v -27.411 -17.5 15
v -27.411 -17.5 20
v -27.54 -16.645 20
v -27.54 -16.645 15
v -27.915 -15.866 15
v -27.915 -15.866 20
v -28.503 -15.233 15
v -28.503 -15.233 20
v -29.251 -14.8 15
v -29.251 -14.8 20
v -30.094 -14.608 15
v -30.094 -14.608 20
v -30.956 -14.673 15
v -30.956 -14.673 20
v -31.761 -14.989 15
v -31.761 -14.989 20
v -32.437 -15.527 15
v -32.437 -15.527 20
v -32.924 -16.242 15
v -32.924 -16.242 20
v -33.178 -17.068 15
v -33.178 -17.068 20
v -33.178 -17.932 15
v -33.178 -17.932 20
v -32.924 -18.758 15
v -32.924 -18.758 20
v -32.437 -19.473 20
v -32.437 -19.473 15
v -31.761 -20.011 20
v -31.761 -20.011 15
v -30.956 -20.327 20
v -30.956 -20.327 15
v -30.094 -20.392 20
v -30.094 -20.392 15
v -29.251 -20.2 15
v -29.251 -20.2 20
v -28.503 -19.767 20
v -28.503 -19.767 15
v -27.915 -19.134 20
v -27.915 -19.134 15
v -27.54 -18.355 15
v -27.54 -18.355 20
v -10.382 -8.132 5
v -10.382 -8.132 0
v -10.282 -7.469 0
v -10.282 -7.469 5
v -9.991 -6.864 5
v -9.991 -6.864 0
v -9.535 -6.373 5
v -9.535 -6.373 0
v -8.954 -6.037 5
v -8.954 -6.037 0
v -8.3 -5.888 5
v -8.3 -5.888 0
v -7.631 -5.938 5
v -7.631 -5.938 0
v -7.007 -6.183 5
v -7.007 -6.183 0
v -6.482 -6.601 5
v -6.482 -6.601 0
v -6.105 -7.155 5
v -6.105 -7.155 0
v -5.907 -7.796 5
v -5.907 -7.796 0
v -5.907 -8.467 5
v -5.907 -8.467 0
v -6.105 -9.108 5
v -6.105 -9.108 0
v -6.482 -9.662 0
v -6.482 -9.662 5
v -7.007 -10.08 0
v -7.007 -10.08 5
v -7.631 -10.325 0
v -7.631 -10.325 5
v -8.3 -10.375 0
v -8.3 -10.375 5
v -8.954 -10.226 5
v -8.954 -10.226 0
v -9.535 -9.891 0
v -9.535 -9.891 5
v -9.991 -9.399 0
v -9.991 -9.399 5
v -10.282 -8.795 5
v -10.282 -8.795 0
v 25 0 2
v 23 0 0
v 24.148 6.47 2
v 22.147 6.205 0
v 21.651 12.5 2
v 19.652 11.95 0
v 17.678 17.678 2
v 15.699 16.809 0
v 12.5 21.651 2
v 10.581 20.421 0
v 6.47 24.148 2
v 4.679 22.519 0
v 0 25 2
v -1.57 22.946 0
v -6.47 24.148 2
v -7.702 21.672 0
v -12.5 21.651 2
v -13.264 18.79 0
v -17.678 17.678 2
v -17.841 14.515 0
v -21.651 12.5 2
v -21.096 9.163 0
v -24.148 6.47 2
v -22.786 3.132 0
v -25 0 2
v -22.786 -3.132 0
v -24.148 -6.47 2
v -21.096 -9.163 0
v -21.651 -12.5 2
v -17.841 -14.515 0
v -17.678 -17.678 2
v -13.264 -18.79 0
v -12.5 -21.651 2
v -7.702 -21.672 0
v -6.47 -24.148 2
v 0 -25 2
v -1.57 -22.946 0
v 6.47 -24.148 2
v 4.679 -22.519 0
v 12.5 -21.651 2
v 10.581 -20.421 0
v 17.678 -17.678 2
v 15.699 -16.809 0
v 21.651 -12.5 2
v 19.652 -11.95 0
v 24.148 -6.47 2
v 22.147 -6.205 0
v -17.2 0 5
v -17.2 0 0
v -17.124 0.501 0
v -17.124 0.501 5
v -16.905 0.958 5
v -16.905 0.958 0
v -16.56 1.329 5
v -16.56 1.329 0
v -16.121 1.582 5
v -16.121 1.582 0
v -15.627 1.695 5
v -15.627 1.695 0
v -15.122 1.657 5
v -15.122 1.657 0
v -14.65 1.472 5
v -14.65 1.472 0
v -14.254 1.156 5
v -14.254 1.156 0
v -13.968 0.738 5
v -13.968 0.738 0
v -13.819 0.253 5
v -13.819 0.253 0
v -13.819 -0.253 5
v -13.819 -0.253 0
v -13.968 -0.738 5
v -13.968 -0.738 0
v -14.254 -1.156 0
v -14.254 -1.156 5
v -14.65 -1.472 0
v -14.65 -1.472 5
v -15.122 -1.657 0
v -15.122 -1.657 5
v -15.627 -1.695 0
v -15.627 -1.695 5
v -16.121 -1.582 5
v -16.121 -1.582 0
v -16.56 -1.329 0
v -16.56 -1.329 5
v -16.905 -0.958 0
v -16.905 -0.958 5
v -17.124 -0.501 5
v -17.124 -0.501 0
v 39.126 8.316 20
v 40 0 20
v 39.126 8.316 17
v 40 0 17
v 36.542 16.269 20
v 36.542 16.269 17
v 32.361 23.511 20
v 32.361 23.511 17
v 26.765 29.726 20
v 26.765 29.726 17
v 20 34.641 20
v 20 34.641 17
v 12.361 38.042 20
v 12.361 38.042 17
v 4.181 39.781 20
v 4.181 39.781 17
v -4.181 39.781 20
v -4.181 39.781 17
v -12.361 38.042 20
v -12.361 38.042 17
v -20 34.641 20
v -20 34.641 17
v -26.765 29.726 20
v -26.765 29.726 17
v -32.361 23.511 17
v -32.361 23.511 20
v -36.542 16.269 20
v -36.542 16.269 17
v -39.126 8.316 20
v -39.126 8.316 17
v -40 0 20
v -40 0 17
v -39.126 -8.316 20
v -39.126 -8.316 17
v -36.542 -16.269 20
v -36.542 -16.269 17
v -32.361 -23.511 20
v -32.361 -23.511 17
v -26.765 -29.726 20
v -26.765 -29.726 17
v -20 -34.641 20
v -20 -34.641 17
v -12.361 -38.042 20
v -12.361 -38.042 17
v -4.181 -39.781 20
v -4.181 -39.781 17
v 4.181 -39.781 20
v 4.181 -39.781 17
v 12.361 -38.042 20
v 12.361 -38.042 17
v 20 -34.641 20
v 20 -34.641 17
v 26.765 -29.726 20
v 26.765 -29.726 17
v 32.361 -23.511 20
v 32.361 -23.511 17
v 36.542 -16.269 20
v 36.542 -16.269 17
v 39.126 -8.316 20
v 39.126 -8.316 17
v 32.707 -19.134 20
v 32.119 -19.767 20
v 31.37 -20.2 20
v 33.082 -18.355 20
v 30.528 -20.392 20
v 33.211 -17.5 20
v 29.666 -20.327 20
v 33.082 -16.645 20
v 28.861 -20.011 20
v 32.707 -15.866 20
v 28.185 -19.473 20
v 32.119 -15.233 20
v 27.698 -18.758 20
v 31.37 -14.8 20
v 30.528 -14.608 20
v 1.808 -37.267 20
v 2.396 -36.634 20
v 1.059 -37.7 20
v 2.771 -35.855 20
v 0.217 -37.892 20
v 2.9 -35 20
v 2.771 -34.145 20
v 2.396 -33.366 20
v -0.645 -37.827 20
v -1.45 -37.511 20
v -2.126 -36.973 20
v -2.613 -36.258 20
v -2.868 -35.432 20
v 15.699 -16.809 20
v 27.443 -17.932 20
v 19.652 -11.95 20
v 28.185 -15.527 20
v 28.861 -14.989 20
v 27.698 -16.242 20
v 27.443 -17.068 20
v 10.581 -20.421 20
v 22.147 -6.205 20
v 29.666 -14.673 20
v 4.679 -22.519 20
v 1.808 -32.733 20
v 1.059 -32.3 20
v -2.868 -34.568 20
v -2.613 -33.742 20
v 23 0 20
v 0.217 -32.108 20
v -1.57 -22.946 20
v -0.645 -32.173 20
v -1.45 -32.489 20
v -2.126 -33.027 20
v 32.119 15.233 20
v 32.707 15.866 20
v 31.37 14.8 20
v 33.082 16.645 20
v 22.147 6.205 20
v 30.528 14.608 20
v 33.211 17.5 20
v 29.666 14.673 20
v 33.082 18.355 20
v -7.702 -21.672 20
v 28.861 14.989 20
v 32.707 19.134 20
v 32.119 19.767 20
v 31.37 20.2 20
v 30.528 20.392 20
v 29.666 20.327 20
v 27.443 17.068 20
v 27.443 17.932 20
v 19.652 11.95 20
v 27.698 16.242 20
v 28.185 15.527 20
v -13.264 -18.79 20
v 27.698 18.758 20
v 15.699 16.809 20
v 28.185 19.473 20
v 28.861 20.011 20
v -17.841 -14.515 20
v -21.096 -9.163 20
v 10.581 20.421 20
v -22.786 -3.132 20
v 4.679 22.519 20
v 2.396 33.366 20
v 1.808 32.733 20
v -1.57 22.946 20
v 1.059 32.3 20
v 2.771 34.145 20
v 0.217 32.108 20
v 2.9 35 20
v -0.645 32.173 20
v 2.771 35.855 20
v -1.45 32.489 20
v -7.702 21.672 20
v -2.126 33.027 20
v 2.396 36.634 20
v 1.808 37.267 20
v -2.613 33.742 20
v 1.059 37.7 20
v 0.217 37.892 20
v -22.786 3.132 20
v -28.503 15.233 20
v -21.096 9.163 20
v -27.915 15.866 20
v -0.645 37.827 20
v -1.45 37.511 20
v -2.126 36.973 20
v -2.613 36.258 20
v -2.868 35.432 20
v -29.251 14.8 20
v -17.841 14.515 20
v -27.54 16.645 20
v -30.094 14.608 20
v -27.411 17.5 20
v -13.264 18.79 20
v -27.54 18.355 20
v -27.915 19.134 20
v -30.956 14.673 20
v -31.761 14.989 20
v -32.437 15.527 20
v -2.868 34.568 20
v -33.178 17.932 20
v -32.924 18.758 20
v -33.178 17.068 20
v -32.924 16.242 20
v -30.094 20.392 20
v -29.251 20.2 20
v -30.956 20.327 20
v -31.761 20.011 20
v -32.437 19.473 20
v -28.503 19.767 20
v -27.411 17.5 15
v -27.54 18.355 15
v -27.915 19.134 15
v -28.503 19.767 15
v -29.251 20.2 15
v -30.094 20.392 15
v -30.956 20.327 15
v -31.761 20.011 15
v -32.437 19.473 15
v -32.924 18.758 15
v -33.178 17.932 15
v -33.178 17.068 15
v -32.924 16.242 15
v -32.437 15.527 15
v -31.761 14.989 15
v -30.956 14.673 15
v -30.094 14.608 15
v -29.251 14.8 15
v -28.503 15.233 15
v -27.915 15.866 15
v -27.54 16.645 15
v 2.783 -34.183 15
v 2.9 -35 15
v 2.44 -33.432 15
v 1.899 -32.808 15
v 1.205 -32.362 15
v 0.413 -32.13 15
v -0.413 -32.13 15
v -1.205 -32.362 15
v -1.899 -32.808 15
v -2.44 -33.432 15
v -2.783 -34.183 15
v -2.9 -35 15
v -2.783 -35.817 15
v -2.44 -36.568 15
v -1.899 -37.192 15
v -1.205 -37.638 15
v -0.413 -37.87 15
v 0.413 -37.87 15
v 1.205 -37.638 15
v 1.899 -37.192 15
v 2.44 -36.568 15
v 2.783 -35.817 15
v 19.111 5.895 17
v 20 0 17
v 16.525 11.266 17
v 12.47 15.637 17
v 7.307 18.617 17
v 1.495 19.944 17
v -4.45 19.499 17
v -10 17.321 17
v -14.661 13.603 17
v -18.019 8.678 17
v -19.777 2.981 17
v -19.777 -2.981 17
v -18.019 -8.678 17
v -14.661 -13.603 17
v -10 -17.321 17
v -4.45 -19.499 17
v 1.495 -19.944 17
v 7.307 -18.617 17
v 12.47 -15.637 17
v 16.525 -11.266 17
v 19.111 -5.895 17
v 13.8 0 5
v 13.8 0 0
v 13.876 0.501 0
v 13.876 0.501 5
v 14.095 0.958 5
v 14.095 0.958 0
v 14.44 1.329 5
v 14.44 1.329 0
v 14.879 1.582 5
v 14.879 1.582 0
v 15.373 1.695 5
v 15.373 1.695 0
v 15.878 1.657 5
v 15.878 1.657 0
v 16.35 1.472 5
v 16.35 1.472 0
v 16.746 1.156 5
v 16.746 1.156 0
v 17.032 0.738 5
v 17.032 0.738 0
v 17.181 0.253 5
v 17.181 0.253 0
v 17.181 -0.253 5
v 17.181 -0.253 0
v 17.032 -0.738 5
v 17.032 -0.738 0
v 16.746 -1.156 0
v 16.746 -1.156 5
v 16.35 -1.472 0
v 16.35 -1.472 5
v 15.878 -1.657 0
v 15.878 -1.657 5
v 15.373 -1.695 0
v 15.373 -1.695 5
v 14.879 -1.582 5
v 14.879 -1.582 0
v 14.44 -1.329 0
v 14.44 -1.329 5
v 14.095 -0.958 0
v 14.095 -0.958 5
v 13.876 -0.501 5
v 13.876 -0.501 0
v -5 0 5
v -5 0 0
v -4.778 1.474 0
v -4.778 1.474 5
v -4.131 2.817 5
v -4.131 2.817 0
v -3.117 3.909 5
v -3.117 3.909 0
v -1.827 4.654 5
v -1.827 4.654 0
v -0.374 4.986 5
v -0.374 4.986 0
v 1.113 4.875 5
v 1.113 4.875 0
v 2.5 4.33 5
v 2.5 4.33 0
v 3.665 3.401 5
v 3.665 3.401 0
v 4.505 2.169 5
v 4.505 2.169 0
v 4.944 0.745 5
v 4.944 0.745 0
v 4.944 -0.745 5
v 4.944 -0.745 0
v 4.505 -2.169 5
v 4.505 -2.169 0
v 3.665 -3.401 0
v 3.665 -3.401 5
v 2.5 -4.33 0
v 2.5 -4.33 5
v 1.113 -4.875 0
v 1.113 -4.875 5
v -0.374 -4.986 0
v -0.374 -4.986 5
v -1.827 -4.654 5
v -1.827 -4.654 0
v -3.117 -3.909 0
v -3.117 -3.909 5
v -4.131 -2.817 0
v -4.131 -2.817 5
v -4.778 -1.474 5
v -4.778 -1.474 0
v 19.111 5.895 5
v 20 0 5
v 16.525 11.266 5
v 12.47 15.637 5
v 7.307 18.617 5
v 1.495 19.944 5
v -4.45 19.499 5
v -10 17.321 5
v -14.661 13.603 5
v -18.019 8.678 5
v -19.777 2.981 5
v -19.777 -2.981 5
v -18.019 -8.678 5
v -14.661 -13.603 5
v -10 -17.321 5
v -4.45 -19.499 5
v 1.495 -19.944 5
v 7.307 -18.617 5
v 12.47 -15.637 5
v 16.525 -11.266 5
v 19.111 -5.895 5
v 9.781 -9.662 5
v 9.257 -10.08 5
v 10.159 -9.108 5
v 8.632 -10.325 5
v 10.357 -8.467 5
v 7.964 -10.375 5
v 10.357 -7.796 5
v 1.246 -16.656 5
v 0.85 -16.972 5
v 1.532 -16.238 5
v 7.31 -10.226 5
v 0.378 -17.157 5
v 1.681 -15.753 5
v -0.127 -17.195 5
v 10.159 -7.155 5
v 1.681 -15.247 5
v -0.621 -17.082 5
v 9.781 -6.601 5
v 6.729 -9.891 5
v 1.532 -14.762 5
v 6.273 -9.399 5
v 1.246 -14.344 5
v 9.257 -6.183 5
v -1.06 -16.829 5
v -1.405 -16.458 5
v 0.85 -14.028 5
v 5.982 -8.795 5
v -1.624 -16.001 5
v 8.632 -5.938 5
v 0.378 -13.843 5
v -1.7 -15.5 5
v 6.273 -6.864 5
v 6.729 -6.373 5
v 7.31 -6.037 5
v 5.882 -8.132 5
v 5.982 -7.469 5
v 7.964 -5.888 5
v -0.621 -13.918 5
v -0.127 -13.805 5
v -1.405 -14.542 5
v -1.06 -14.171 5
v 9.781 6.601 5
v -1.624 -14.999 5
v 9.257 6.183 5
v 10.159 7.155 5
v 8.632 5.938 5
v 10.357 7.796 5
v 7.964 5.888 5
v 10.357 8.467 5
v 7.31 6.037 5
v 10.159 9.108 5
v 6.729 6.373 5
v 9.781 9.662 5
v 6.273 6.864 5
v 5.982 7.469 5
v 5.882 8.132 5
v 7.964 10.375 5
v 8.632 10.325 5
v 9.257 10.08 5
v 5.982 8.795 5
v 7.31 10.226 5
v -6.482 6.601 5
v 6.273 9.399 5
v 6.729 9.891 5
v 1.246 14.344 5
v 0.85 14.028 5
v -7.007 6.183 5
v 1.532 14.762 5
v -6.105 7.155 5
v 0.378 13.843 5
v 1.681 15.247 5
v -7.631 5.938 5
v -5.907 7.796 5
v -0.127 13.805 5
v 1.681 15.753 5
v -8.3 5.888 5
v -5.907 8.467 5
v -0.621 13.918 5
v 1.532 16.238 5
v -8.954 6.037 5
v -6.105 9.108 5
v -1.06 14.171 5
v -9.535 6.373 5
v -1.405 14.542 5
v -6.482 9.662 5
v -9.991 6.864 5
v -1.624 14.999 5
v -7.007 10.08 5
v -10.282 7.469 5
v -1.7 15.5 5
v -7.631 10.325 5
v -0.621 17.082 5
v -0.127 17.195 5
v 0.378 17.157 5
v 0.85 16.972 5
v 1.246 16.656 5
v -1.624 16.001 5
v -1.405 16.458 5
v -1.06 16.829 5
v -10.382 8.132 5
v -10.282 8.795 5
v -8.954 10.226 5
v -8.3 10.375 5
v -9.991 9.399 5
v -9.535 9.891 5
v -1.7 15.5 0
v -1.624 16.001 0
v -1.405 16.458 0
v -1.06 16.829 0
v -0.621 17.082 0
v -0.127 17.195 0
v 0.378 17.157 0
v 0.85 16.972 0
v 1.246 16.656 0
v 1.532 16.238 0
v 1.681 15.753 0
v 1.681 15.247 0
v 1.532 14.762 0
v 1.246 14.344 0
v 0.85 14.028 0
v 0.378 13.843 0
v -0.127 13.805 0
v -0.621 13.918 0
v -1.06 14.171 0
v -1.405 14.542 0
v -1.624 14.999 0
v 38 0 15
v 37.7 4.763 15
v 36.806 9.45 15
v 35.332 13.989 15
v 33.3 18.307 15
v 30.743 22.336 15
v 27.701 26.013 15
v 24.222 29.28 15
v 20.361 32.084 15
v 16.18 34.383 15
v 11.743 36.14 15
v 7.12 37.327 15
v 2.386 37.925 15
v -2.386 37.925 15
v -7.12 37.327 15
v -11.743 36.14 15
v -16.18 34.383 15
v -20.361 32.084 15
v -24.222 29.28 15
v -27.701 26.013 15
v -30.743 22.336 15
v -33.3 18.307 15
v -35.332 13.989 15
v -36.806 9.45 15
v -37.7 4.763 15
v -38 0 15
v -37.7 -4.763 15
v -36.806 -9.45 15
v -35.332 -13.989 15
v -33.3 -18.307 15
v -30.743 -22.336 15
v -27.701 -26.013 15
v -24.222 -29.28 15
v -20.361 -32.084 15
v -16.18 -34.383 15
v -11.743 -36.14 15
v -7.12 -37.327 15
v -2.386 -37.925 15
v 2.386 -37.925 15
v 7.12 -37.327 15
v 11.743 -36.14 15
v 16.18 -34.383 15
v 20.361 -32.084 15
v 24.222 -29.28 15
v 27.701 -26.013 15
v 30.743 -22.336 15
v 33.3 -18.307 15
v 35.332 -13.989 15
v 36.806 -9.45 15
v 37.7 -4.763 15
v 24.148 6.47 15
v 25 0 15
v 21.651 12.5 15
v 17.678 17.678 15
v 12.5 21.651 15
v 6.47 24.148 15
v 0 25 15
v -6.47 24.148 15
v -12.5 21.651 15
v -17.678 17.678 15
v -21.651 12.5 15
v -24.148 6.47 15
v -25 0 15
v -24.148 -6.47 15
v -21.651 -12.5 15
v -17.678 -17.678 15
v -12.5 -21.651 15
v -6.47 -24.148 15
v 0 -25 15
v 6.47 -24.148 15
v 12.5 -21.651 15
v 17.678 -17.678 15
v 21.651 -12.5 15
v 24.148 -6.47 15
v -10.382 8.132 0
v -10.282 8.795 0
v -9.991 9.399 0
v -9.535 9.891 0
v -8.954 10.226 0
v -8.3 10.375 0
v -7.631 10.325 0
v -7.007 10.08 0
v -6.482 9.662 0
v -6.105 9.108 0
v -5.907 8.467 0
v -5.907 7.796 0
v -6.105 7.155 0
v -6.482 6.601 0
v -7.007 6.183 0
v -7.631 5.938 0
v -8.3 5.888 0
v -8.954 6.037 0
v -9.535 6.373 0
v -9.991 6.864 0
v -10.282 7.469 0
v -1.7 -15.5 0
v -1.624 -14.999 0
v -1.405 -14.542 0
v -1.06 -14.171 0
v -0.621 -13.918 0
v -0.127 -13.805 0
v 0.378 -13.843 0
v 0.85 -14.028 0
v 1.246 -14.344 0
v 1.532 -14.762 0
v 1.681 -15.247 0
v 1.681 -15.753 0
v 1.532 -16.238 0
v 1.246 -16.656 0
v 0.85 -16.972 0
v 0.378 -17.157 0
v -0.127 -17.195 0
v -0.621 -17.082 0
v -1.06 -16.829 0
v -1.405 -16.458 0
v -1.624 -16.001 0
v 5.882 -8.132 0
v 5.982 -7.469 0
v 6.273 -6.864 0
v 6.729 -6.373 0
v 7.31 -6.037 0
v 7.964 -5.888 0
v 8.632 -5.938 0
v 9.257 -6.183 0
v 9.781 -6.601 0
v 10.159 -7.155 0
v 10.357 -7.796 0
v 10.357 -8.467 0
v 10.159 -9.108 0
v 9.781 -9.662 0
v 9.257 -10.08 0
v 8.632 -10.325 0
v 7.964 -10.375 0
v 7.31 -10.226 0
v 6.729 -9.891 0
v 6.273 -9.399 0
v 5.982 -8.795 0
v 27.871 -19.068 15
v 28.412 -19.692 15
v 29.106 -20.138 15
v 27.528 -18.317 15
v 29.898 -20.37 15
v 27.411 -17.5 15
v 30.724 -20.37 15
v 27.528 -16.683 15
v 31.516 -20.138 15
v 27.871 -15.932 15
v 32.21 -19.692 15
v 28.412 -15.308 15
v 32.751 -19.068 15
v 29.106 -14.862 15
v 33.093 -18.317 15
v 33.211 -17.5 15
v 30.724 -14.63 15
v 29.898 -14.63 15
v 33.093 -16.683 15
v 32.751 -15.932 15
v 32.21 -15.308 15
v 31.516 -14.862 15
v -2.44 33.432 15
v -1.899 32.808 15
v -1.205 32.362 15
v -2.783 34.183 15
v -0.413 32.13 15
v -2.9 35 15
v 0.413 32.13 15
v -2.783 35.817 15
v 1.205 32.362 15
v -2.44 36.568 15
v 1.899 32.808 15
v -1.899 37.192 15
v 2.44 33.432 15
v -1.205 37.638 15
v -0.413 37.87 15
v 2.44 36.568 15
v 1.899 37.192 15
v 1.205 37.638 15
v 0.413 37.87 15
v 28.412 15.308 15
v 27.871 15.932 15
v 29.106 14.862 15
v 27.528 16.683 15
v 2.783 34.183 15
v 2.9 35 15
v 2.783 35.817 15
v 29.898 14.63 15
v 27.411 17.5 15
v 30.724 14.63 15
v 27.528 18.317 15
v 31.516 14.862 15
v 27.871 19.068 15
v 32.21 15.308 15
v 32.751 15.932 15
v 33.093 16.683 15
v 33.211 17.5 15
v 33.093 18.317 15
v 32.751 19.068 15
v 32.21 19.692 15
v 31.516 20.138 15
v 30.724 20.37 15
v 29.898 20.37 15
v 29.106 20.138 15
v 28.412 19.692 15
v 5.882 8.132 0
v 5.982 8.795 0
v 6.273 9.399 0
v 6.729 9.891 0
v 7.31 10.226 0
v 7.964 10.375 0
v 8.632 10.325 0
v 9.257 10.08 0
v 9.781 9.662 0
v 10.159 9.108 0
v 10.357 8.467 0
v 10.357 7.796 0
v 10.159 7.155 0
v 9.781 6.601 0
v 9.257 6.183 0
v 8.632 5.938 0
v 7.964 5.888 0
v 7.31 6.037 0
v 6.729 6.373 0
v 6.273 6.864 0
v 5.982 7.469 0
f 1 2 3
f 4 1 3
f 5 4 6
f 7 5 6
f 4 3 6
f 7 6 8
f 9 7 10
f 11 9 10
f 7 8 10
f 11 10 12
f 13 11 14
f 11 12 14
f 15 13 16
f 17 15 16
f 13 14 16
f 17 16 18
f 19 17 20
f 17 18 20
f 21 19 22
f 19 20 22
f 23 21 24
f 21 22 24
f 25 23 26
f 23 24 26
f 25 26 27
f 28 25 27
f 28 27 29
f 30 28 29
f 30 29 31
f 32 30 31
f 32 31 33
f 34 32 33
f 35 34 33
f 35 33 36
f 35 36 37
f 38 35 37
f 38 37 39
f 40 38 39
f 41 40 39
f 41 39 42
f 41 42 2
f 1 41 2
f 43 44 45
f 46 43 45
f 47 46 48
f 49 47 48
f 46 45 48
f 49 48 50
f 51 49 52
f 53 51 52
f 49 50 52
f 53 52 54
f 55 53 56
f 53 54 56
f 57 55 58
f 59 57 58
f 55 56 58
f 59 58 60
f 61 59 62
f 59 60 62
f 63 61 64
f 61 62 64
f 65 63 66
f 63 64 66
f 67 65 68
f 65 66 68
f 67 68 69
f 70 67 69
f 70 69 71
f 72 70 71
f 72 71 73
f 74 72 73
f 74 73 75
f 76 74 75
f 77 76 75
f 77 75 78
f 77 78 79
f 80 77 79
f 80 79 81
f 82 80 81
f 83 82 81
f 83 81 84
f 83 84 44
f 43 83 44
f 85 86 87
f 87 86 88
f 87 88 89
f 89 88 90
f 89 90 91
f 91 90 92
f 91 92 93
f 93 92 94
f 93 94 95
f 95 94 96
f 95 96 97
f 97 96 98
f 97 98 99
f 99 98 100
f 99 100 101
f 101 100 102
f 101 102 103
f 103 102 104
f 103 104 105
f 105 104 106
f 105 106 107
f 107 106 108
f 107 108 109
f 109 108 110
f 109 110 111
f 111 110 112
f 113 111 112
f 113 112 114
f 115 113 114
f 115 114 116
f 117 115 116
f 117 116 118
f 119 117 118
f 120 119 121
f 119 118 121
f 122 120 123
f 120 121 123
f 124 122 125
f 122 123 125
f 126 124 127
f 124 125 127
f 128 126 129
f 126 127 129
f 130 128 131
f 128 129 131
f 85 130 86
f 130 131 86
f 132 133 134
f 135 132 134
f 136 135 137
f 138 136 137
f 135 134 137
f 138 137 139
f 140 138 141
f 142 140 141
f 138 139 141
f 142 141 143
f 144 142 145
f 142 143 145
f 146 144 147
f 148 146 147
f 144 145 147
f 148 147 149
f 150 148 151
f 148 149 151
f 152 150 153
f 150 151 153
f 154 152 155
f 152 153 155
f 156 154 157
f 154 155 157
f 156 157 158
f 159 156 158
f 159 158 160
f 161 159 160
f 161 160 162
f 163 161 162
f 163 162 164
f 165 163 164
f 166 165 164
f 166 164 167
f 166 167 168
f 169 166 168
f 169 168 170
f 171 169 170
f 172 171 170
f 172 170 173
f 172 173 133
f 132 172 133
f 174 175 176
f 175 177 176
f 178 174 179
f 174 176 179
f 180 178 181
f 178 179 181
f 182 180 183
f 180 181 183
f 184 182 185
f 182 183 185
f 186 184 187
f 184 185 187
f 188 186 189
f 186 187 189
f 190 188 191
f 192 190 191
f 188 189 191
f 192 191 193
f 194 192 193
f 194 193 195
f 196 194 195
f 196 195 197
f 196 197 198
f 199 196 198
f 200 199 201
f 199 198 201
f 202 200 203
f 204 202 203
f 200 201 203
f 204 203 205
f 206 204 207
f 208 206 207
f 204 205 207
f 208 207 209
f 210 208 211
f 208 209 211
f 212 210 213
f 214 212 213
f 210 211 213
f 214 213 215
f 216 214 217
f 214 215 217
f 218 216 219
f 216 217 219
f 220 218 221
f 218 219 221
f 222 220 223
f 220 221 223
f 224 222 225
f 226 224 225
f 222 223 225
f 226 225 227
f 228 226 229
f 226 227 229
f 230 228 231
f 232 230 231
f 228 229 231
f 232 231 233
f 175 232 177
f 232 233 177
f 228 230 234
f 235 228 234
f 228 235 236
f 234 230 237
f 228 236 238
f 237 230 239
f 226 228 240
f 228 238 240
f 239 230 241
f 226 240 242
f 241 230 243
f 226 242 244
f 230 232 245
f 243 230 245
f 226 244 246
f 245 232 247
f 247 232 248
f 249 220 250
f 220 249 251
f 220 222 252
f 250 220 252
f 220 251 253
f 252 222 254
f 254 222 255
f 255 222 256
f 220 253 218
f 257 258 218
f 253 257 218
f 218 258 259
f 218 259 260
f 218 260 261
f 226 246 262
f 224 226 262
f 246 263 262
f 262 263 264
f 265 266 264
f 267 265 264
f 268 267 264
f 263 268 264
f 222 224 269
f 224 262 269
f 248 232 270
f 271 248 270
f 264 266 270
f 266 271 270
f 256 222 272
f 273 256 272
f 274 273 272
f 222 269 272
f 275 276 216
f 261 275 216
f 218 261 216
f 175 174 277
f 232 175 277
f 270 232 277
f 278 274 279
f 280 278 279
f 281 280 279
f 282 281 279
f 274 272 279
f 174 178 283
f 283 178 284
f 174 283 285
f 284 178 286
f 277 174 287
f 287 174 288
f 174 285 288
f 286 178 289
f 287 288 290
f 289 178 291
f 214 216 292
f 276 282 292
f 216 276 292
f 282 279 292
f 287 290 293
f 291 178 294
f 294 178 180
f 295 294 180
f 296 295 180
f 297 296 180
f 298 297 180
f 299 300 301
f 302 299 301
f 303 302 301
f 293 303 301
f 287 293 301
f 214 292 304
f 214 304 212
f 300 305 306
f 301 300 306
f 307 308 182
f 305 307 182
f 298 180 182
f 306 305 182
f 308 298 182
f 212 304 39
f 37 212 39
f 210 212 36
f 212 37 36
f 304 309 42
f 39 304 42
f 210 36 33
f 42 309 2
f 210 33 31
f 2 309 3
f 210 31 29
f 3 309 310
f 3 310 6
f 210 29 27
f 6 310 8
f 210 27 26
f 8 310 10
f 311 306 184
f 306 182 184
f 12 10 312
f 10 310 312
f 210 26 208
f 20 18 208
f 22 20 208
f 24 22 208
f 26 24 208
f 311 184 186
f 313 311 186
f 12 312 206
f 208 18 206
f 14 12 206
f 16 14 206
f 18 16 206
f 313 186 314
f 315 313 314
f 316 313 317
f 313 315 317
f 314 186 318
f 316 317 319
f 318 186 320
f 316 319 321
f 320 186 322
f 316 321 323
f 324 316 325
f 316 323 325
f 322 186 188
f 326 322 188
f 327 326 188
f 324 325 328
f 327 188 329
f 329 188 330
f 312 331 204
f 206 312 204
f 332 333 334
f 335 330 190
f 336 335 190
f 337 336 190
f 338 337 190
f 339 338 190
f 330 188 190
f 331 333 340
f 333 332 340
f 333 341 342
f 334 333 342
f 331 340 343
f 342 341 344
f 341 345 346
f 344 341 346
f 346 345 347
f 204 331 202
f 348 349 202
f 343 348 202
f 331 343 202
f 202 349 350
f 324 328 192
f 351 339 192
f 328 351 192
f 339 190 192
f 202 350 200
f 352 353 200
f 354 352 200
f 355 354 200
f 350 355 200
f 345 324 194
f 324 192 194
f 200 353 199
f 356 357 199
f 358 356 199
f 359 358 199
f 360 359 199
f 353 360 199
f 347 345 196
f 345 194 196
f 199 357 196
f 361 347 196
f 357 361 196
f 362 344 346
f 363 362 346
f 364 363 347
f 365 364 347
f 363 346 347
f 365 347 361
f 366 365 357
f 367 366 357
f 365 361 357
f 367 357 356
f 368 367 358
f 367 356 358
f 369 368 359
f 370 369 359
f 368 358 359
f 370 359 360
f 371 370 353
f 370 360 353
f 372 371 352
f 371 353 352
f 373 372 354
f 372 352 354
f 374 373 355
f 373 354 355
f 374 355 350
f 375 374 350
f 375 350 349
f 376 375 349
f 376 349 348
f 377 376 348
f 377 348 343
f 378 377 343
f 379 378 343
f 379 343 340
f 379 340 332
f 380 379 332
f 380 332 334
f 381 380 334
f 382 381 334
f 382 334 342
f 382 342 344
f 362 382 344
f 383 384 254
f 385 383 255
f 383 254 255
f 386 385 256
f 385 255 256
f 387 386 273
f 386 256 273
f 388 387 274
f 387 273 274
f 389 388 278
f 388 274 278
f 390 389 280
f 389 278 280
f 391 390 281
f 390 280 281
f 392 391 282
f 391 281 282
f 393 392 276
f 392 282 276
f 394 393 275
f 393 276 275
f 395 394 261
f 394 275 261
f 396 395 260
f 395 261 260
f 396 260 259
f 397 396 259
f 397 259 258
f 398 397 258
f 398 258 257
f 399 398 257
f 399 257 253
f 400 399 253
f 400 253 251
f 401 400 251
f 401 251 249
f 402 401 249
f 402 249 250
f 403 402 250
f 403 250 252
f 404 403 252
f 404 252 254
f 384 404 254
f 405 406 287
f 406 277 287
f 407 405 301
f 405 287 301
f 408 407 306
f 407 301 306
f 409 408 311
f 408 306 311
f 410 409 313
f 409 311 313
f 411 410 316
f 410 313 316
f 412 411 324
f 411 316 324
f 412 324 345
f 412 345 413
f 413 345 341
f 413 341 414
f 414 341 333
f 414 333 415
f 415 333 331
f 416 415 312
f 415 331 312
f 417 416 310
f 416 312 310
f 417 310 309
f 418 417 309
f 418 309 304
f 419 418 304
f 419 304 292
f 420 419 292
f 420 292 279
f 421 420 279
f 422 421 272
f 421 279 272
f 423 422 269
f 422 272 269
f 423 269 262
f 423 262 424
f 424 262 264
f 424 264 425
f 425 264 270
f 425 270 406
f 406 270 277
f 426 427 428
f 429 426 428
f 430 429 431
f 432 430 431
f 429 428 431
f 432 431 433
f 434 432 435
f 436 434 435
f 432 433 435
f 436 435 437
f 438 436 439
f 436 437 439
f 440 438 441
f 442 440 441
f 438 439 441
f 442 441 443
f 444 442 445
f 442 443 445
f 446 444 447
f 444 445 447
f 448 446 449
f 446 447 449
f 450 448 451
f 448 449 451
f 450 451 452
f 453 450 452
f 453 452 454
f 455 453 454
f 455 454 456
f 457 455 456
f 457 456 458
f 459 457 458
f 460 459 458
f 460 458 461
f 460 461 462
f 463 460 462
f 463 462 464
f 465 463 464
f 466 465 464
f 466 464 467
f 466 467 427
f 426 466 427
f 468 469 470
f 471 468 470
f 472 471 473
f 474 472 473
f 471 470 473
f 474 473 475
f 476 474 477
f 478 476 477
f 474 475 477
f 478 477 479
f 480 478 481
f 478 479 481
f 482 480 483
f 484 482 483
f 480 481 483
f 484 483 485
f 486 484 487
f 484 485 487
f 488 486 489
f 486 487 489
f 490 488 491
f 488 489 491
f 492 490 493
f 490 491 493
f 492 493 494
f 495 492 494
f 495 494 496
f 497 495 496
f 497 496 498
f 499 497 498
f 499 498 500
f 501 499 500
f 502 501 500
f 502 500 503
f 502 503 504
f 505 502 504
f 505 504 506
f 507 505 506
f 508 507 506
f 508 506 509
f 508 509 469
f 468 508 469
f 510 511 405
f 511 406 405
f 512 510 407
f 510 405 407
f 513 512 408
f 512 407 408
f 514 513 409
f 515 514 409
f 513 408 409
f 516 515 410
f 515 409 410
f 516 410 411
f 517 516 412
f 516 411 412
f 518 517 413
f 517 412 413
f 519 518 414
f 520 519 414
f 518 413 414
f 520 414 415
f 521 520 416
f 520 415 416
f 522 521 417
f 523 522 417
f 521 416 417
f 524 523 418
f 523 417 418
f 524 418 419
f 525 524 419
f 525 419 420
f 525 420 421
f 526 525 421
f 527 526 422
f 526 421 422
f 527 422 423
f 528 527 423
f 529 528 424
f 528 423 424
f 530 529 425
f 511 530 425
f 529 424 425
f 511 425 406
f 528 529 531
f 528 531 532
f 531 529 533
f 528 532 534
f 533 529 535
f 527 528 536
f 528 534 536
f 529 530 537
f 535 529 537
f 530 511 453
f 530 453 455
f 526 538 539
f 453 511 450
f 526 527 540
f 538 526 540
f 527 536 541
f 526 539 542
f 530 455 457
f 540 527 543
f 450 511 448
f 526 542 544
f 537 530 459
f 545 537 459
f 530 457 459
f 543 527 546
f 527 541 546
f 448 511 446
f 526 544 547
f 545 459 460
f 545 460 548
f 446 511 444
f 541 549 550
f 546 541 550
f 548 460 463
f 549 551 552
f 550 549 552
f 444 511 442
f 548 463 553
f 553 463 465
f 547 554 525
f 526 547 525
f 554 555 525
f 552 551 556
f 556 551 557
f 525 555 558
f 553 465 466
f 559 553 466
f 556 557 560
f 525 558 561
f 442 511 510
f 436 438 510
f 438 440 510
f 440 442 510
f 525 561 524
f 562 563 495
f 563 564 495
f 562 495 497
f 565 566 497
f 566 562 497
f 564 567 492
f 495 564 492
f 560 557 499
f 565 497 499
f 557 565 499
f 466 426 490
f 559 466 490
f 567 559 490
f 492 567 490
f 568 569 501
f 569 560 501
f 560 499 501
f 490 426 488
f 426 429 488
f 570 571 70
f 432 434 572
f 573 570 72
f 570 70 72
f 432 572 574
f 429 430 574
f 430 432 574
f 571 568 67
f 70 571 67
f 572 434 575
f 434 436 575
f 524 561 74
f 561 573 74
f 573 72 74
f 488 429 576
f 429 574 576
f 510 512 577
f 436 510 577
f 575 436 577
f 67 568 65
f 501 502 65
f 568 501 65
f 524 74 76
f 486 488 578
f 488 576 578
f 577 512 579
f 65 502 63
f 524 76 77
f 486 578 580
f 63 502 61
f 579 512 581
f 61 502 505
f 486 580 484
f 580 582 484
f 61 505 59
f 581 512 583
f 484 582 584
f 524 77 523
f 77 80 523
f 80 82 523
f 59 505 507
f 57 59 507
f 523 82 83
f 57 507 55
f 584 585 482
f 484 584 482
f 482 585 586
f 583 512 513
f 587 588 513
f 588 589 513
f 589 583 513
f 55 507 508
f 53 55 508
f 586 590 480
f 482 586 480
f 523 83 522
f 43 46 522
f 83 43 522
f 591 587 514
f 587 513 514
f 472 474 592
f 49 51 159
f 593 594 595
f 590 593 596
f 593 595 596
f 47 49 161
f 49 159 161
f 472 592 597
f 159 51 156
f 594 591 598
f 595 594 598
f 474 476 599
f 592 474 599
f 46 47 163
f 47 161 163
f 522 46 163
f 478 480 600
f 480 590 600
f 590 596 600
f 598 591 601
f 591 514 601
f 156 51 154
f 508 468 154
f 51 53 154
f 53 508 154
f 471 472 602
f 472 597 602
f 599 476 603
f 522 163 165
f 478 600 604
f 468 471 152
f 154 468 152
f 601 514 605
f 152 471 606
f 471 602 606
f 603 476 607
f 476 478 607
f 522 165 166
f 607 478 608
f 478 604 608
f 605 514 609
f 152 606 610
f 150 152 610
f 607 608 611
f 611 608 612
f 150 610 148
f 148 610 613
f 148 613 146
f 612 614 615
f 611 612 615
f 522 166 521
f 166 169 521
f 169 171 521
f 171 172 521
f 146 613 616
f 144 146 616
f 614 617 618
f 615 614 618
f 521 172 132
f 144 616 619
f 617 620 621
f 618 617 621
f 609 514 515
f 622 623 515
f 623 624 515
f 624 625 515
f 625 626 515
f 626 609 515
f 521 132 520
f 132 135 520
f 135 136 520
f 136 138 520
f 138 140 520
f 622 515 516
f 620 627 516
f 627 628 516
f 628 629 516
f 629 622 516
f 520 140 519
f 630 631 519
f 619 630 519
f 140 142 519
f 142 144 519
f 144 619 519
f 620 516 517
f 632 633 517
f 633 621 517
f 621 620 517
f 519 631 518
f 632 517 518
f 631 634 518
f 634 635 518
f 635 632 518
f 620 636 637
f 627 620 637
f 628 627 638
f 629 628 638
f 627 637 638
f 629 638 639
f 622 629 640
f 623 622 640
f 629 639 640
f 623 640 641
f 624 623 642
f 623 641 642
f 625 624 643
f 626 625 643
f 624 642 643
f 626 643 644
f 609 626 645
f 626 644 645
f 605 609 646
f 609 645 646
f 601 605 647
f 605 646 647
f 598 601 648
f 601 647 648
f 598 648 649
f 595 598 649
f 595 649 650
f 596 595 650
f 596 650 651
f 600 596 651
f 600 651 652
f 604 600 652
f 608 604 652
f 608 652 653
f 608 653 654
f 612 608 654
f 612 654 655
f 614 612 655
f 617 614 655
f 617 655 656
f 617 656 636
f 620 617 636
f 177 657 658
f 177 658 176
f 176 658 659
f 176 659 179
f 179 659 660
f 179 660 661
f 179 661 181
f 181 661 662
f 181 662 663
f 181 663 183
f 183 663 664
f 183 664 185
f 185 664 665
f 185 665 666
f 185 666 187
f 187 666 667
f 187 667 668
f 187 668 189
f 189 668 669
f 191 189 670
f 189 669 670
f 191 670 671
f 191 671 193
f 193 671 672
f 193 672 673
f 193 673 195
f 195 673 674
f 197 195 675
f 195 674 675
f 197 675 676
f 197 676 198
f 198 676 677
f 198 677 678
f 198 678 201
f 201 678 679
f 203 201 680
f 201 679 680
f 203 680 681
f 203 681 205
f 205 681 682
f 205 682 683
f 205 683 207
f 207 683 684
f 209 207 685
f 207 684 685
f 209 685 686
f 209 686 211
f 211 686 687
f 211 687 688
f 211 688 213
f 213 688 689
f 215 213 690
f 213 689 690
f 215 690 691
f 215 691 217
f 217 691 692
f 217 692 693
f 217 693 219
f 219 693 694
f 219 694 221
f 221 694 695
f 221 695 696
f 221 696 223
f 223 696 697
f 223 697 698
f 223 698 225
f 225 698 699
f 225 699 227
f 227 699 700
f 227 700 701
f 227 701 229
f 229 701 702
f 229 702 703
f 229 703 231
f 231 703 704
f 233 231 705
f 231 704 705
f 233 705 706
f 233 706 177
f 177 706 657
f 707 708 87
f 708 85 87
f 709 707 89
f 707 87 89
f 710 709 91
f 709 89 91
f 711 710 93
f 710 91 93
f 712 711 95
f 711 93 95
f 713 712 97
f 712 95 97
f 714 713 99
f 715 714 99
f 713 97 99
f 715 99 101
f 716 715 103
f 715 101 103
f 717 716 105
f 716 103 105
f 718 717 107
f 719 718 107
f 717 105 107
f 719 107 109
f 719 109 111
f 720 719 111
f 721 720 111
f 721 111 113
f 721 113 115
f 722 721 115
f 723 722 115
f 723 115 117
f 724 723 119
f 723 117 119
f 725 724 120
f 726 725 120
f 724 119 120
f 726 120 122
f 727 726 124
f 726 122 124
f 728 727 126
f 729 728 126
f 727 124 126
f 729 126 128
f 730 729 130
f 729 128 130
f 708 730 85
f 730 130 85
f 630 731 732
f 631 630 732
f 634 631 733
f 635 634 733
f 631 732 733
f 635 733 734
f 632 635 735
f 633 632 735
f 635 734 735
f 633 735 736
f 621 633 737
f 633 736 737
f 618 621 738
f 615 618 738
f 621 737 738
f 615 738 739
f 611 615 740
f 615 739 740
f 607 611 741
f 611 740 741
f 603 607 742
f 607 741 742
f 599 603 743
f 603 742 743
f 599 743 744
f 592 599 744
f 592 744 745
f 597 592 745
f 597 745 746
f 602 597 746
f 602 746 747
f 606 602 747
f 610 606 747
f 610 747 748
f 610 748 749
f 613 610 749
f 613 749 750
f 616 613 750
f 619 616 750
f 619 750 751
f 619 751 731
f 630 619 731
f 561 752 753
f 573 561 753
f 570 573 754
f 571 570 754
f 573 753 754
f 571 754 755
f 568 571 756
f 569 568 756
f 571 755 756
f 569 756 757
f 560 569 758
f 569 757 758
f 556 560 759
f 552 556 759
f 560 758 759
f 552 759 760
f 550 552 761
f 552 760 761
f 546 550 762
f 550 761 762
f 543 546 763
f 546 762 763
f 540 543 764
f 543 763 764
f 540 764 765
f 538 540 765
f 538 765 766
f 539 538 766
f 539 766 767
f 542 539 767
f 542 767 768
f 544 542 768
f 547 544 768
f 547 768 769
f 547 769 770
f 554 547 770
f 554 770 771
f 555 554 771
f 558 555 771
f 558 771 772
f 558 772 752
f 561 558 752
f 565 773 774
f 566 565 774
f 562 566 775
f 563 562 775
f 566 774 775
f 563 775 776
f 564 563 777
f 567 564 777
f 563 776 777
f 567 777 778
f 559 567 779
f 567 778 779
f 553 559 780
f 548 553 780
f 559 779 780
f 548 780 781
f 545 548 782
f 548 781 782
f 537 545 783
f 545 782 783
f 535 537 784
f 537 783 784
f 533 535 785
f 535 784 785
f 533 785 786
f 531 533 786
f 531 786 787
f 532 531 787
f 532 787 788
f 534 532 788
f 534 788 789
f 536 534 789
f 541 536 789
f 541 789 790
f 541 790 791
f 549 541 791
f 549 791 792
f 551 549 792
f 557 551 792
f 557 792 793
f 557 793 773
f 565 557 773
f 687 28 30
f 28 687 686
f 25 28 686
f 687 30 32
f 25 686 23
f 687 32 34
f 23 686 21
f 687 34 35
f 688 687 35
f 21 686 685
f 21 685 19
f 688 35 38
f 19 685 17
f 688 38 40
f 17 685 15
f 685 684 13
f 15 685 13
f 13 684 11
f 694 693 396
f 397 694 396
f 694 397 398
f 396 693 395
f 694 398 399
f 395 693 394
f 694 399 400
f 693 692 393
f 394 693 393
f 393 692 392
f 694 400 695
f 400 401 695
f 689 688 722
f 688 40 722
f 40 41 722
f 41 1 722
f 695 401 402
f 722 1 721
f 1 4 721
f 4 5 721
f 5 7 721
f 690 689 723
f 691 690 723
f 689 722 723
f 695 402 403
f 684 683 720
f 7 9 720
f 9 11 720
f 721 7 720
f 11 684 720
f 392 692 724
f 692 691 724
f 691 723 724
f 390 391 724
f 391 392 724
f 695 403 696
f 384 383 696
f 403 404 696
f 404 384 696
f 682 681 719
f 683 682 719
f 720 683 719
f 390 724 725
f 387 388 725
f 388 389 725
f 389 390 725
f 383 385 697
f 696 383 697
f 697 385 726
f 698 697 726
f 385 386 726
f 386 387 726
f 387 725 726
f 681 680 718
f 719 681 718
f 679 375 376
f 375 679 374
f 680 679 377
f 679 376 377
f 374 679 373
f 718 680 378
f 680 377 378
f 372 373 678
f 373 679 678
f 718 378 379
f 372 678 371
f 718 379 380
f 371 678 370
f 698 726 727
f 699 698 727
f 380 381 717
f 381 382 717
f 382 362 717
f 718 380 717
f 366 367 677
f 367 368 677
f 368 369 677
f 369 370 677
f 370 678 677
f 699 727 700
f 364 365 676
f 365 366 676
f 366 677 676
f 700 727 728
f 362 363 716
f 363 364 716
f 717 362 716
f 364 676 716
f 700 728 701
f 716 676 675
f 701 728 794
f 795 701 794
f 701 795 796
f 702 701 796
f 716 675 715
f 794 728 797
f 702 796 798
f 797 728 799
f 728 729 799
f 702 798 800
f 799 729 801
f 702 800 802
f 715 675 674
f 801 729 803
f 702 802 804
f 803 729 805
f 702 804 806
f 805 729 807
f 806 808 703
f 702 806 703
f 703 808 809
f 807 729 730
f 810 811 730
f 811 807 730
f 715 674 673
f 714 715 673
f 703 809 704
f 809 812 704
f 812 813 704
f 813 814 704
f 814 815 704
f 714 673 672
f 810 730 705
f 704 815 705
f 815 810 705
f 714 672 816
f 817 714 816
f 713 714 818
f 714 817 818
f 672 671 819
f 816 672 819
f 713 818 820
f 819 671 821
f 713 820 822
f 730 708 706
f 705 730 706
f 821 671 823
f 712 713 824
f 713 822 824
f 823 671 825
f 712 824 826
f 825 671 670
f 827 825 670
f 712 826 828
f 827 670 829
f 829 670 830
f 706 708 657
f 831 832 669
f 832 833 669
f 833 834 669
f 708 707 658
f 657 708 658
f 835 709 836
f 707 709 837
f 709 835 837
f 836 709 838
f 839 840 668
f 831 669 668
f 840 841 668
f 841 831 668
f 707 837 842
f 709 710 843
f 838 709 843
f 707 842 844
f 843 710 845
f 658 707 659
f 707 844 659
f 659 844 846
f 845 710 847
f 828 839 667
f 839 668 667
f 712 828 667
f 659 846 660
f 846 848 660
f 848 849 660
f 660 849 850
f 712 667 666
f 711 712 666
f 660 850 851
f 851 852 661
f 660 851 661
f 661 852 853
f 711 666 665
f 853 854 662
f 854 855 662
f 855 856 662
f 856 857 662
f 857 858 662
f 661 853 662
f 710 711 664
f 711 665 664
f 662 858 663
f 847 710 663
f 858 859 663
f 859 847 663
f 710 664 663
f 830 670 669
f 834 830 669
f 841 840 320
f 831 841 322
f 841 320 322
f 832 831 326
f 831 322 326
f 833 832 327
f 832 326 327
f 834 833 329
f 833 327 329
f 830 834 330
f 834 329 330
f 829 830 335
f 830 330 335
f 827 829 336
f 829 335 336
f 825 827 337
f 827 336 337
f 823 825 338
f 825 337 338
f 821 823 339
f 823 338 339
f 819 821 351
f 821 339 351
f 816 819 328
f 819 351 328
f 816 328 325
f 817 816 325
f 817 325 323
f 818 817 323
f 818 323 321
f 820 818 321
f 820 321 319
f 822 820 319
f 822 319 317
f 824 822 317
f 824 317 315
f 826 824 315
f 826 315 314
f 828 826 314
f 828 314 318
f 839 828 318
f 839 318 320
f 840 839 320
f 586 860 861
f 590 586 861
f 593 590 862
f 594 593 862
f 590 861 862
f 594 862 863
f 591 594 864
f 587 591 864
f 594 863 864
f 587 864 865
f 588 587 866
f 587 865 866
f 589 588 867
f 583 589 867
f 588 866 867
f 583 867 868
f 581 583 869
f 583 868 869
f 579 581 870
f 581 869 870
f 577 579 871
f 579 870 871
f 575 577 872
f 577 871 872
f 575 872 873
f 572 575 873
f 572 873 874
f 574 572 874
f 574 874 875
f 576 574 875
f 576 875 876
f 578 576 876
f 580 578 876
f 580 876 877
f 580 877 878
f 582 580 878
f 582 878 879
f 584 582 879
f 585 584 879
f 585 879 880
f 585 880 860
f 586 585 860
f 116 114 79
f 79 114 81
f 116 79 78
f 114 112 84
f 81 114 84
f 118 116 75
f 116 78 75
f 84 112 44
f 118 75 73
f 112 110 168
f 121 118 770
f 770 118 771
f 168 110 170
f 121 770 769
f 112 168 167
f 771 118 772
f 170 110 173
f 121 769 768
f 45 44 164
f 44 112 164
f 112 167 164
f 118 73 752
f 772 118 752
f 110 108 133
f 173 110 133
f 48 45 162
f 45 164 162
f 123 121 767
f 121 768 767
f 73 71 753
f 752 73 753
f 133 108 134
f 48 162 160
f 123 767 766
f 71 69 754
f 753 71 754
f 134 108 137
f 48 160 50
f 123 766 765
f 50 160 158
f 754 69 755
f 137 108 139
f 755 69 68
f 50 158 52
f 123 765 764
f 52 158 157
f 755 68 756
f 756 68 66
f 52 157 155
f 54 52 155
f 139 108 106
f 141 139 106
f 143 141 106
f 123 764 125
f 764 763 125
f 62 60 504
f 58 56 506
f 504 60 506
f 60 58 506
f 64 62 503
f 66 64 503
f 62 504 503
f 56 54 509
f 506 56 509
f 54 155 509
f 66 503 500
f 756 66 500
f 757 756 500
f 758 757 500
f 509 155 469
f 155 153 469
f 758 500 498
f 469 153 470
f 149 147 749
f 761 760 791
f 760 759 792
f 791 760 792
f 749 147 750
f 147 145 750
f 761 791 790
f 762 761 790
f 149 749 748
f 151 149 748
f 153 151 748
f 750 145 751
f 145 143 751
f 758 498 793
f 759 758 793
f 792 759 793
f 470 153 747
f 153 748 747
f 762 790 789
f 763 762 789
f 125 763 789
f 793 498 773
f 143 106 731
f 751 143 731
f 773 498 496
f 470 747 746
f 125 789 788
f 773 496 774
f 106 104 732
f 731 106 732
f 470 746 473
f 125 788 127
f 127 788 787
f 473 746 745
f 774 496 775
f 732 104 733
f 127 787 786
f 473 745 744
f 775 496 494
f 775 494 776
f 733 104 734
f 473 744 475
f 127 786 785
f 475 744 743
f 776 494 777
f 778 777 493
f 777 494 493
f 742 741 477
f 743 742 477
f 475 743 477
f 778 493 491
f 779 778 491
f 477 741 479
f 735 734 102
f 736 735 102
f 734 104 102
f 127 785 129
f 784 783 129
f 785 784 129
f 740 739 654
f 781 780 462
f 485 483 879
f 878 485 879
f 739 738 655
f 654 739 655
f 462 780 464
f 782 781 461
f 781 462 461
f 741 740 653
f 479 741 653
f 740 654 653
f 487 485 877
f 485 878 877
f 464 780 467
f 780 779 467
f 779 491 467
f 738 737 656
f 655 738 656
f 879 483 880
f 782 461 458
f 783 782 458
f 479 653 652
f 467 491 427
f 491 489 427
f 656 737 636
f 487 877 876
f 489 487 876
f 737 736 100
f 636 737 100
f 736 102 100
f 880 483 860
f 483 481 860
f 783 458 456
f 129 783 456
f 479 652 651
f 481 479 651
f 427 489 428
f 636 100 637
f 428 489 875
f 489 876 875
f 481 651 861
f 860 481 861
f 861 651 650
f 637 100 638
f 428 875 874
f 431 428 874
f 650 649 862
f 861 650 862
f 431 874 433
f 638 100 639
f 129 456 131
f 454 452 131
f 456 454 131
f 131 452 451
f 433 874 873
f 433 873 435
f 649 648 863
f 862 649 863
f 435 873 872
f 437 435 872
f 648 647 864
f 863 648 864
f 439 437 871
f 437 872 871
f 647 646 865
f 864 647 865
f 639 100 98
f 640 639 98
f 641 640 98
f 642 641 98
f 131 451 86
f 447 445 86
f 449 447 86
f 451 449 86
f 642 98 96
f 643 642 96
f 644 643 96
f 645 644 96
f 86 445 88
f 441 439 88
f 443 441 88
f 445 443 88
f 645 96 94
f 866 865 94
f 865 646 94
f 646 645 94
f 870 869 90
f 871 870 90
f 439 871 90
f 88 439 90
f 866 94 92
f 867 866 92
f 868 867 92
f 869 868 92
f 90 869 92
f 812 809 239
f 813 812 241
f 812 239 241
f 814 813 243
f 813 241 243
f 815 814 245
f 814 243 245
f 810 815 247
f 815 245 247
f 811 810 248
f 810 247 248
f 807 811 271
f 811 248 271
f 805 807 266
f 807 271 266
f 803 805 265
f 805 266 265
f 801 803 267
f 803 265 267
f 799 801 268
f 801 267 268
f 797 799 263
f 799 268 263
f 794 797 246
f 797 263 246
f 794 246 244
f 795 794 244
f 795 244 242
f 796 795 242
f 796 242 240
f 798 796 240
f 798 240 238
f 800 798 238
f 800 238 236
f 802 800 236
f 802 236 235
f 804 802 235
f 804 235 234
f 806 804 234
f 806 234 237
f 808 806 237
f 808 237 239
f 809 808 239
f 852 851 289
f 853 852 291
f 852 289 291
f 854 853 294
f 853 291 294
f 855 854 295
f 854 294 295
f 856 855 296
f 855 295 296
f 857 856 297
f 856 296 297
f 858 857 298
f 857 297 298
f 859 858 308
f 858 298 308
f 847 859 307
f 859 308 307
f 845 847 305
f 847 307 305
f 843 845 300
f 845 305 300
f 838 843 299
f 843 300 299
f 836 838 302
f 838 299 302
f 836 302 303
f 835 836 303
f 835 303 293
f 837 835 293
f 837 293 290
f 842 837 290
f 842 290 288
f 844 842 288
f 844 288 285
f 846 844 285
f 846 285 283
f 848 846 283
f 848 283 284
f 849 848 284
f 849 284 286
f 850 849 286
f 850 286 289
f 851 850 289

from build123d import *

# Parameters (mm, degrees)
CUT_EXTRUDE_1_REACH = 62
SKETCH_9_R          = 2.25
SKETCH_9_R_2        = 5
SKETCH_9_R_3        = 1.7
SKETCH_11_R         = 2.9
CUT_EXTRUDE_2_DEPTH = 10


with BuildPart() as part:
    # 草图1 → 旋转1 (revolve)
    with BuildSketch(Plane(origin=(0, 0, 0), x_dir=(1, 0, 0), z_dir=(0, 1, 0))):
        Polygon((38, -15), (25, -15), (25, -2), (23, 0), (0, 0), (0, -5), (20, -5), (20, -17), (23, -20), (40, -20), (40, -17), align=None)
    revolve(axis=Axis((0, 0, 0), (0, 0, 1)))

    # 草图9 → 切除-拉伸1 (cut, up to next)
    with BuildSketch(Plane(origin=(0, 0, 0), x_dir=(-1, 0, 0), z_dir=(0, 0, -1)), mode=Mode.PRIVATE) as cut_extrude_1_sk1:
        with Locations((-8.131727984, 8.131727984)):
            Circle(SKETCH_9_R)
    cut_extrude_1_tool1 = extrude(cut_extrude_1_sk1.sketch, amount=-CUT_EXTRUDE_1_REACH, mode=Mode.PRIVATE) & part.part
    # 草图9 → 切除-拉伸1 (cut, up to next)
    with BuildSketch(Plane(origin=(0, 0, 0), x_dir=(-1, 0, 0), z_dir=(0, 0, -1)), mode=Mode.PRIVATE) as cut_extrude_1_sk2:
        with Locations((8.131727984, 8.131727984)):
            Circle(SKETCH_9_R)
    cut_extrude_1_tool2 = extrude(cut_extrude_1_sk2.sketch, amount=-CUT_EXTRUDE_1_REACH, mode=Mode.PRIVATE) & part.part
    # 草图9 → 切除-拉伸1 (cut, up to next)
    with BuildSketch(Plane(origin=(0, 0, 0), x_dir=(-1, 0, 0), z_dir=(0, 0, -1)), mode=Mode.PRIVATE) as cut_extrude_1_sk3:
        with Locations((8.131727984, -8.131727984)):
            Circle(SKETCH_9_R)
    cut_extrude_1_tool3 = extrude(cut_extrude_1_sk3.sketch, amount=-CUT_EXTRUDE_1_REACH, mode=Mode.PRIVATE) & part.part
    # 草图9 → 切除-拉伸1 (cut, up to next)
    with BuildSketch(Plane(origin=(0, 0, 0), x_dir=(-1, 0, 0), z_dir=(0, 0, -1)), mode=Mode.PRIVATE) as cut_extrude_1_sk4:
        with Locations((-8.131727984, -8.131727984)):
            Circle(SKETCH_9_R)
    cut_extrude_1_tool4 = extrude(cut_extrude_1_sk4.sketch, amount=-CUT_EXTRUDE_1_REACH, mode=Mode.PRIVATE) & part.part
    # 草图9 → 切除-拉伸1 (cut, up to next)
    with BuildSketch(Plane(origin=(0, 0, 0), x_dir=(-1, 0, 0), z_dir=(0, 0, -1)), mode=Mode.PRIVATE) as cut_extrude_1_sk5:
        Circle(SKETCH_9_R_2)
    cut_extrude_1_tool5 = extrude(cut_extrude_1_sk5.sketch, amount=-CUT_EXTRUDE_1_REACH, mode=Mode.PRIVATE) & part.part
    # 草图9 → 切除-拉伸1 (cut, up to next)
    with BuildSketch(Plane(origin=(0, 0, 0), x_dir=(-1, 0, 0), z_dir=(0, 0, -1)), mode=Mode.PRIVATE) as cut_extrude_1_sk6:
        with Locations((0, 15.5)):
            Circle(SKETCH_9_R_3)
    cut_extrude_1_tool6 = extrude(cut_extrude_1_sk6.sketch, amount=-CUT_EXTRUDE_1_REACH, mode=Mode.PRIVATE) & part.part
    # 草图9 → 切除-拉伸1 (cut, up to next)
    with BuildSketch(Plane(origin=(0, 0, 0), x_dir=(-1, 0, 0), z_dir=(0, 0, -1)), mode=Mode.PRIVATE) as cut_extrude_1_sk7:
        with Locations((-15.5, 0)):
            Circle(SKETCH_9_R_3)
    cut_extrude_1_tool7 = extrude(cut_extrude_1_sk7.sketch, amount=-CUT_EXTRUDE_1_REACH, mode=Mode.PRIVATE) & part.part
    # 草图9 → 切除-拉伸1 (cut, up to next)
    with BuildSketch(Plane(origin=(0, 0, 0), x_dir=(-1, 0, 0), z_dir=(0, 0, -1)), mode=Mode.PRIVATE) as cut_extrude_1_sk8:
        with Locations((0, -15.5)):
            Circle(SKETCH_9_R_3)
    cut_extrude_1_tool8 = extrude(cut_extrude_1_sk8.sketch, amount=-CUT_EXTRUDE_1_REACH, mode=Mode.PRIVATE) & part.part
    # 草图9 → 切除-拉伸1 (cut, up to next)
    with BuildSketch(Plane(origin=(0, 0, 0), x_dir=(-1, 0, 0), z_dir=(0, 0, -1)), mode=Mode.PRIVATE) as cut_extrude_1_sk9:
        with Locations((15.5, 0)):
            Circle(SKETCH_9_R_3)
    cut_extrude_1_tool9 = extrude(cut_extrude_1_sk9.sketch, amount=-CUT_EXTRUDE_1_REACH, mode=Mode.PRIVATE) & part.part
    add(cut_extrude_1_tool1.solids().sort_by_distance((8.131728, 8.131728, 0))[0], mode=Mode.SUBTRACT)
    add(cut_extrude_1_tool2.solids().sort_by_distance((-8.131728, 8.131728, 0))[0], mode=Mode.SUBTRACT)
    add(cut_extrude_1_tool3.solids().sort_by_distance((-8.131728, -8.131728, 0))[0], mode=Mode.SUBTRACT)
    add(cut_extrude_1_tool4.solids().sort_by_distance((8.131728, -8.131728, 0))[0], mode=Mode.SUBTRACT)
    add(cut_extrude_1_tool5.solids().sort_by_distance((0, 0, 0))[0], mode=Mode.SUBTRACT)
    add(cut_extrude_1_tool6.solids().sort_by_distance((0, 15.5, 0))[0], mode=Mode.SUBTRACT)
    add(cut_extrude_1_tool7.solids().sort_by_distance((15.5, 0, 0))[0], mode=Mode.SUBTRACT)
    add(cut_extrude_1_tool8.solids().sort_by_distance((0, -15.5, 0))[0], mode=Mode.SUBTRACT)
    add(cut_extrude_1_tool9.solids().sort_by_distance((-15.5, 0, 0))[0], mode=Mode.SUBTRACT)

    # 草图11 → 切除-拉伸2 (cut)
    with BuildSketch(Plane.XY.offset(20)):
        with Locations((0, 35)):
            Circle(SKETCH_11_R)
        with Locations((-30.310889132, 17.5)):
            Circle(SKETCH_11_R)
        with Locations((-30.310889132, -17.5)):
            Circle(SKETCH_11_R)
        with Locations((0, -35)):
            Circle(SKETCH_11_R)
        with Locations((30.310889132, -17.5)):
            Circle(SKETCH_11_R)
        with Locations((30.310889132, 17.5)):
            Circle(SKETCH_11_R)
    extrude(amount=-CUT_EXTRUDE_2_DEPTH, mode=Mode.SUBTRACT)


solid = part.part
